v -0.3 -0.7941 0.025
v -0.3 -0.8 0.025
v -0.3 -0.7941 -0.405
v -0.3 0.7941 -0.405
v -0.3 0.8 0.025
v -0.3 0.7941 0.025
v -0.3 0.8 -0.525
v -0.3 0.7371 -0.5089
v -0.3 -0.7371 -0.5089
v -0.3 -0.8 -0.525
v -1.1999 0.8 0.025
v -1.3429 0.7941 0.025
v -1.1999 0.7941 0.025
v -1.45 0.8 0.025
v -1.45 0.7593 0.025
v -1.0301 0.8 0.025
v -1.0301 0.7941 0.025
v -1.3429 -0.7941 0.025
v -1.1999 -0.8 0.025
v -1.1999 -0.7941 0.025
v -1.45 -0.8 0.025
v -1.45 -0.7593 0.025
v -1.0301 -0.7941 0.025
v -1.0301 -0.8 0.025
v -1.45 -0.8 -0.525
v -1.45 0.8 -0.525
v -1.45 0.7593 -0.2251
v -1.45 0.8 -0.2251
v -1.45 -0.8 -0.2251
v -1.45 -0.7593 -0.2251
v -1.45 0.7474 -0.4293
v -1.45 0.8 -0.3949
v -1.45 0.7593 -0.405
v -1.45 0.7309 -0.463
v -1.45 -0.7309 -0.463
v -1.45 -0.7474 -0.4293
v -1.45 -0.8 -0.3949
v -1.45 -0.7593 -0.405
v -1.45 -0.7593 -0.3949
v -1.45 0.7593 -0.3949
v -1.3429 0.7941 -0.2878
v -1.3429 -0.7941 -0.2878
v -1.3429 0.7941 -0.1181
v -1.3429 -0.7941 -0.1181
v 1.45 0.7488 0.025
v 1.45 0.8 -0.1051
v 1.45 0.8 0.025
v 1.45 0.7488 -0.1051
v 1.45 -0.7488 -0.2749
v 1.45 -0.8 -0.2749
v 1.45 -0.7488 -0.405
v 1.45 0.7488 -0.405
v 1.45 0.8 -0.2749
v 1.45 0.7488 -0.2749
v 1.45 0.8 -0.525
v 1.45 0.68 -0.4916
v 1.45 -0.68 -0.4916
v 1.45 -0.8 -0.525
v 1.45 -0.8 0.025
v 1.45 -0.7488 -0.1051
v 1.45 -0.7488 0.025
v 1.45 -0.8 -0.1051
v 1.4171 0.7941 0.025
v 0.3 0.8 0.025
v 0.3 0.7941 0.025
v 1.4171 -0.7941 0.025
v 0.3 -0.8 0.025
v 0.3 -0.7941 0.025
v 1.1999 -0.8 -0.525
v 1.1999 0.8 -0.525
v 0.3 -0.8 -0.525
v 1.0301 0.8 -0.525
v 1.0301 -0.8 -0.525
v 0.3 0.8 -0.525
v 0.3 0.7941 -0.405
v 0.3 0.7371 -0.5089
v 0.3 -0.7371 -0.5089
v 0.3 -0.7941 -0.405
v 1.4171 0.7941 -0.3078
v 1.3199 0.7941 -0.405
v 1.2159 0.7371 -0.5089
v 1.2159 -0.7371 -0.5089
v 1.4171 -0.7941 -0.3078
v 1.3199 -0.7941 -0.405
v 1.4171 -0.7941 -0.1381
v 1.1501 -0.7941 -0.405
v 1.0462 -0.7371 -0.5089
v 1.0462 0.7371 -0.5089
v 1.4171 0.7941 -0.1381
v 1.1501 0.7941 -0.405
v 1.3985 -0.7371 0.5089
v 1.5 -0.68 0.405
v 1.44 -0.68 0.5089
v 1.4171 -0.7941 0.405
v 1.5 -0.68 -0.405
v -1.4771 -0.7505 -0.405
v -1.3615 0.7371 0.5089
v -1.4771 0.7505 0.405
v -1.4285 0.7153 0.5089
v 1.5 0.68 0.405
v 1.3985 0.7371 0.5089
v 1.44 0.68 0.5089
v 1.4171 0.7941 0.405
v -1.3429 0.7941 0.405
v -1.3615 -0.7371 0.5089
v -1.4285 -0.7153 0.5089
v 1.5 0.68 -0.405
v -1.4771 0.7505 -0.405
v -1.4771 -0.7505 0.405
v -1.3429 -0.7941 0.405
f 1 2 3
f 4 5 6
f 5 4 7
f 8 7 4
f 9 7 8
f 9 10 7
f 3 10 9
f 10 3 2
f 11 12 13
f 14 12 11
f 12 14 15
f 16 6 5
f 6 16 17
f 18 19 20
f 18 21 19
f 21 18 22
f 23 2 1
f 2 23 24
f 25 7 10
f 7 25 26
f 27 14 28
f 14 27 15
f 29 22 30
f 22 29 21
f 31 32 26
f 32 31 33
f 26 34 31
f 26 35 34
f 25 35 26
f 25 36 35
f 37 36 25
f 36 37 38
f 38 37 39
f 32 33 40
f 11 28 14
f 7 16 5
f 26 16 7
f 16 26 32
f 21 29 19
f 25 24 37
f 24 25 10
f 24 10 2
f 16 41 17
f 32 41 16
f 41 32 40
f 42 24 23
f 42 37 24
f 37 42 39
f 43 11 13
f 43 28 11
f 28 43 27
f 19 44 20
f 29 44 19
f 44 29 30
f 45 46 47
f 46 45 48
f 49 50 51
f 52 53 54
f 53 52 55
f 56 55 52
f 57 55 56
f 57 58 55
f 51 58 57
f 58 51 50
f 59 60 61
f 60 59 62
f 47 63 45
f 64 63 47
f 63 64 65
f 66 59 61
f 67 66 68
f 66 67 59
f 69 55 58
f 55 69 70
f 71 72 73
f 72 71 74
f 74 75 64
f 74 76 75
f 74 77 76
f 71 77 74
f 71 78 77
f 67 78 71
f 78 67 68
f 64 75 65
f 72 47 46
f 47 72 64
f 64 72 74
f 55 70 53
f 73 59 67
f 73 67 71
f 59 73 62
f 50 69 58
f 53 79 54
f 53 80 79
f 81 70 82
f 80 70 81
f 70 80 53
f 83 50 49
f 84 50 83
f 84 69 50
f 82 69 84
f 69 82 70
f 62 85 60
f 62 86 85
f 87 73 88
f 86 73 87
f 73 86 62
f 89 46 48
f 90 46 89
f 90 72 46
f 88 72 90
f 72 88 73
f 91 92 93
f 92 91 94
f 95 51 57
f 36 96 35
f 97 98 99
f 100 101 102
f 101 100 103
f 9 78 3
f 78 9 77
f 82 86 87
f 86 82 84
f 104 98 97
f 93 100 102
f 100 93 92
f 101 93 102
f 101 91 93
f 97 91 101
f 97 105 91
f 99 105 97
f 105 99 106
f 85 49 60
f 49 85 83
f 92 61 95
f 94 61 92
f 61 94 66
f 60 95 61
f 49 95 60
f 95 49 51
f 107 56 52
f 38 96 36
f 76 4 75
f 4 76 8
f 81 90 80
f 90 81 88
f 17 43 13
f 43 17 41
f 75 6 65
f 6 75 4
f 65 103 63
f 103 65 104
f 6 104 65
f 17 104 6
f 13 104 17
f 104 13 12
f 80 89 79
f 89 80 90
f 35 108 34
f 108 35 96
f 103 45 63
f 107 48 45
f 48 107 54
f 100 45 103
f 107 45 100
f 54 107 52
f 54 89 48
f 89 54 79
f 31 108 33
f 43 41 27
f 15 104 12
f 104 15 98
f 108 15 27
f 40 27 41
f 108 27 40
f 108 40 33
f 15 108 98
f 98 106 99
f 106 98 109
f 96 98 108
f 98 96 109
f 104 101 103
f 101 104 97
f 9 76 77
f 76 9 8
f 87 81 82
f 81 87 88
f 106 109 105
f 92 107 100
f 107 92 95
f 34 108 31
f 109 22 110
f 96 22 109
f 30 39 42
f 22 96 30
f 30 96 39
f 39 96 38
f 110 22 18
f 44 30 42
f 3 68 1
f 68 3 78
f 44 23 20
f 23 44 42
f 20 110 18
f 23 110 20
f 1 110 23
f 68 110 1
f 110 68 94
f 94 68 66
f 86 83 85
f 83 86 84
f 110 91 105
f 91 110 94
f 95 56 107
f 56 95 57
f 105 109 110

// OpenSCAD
// Parameters
body_L = 3.0; //[1.5:6.0:0.05]
body_W = 1.6; //[0.8:3.2:0.05]
body_H = 1.05; //[0.5:2.1:0.05]
term_L = 0.35; //[0.15:0.7:0.01]
term_H = 0.55; //[0.25:1.1:0.01]
term_inset = 0.05; //[0.0:0.2:0.01]
overlap = 0.8; //[0.5:2.0:0.1]
mark_L = 1.2; //[0.6:2.4:0.05]
mark_W = 0.5; //[0.2:1.2:0.05]
mark_H = 0.03; //[0.01:0.1:0.01]
fillet_r = 0.12; //[0.05:0.3:0.01]
chamfer_L = 0.12; //[0.05:0.3:0.01]

// Base shapes
module chip_body_base() {
  cube([body_L - 2*fillet_r, body_W - 2*fillet_r, body_H - 2*fillet_r], center=true);
}

module fillet_sphere() {
  sphere(r=fillet_r, center=true);
}

module terminal_block() {
  cube([term_L + overlap, body_W, term_H], center=true);
}

module chamfer_cutter() {
  rotate([0, 45, 0])
    cube([chamfer_L, body_W + 2*overlap, term_H + 2*overlap], center=true);
}

module top_marking() {
  cube([mark_L, mark_W, mark_H], center=true);
}

// Operations
module chip_body_fillet() {
  minkowski() {
    chip_body_base();
    fillet_sphere();
  }
}

module terminal_left_pos() {
  translate([-(body_L/2 - term_inset - (term_L + overlap)/2), 0, -body_H/2 + term_H/2])
    terminal_block();
}

module terminal_right_pos() {
  translate([(body_L/2 - term_inset - (term_L + overlap)/2), 0, -body_H/2 + term_H/2])
    terminal_block();
}

module chamfer_left_pos() {
  translate([-(body_L/2 - term_inset - chamfer_L/2), 0, -body_H/2 + term_H/2])
    chamfer_cutter();
}

module chamfer_right_pos() {
  translate([(body_L/2 - term_inset - chamfer_L/2), 0, -body_H/2 + term_H/2])
    chamfer_cutter();
}

module terminal_left_chamfered() {
  difference() {
    terminal_left_pos();
    chamfer_left_pos();
  }
}

module terminal_right_chamfered() {
  difference() {
    terminal_right_pos();
    chamfer_right_pos();
  }
}

module end_terminals_2x() {
  union() {
    terminal_left_chamfered();
    terminal_right_chamfered();
  }
}

module smd_complete_model() {
  union() {
    chip_body_fillet();
    end_terminals_2x();
    translate([0, 0, body_H/2 + mark_H/2 - overlap])
      top_marking();
  }
}

// Final output
smd_complete_model();
